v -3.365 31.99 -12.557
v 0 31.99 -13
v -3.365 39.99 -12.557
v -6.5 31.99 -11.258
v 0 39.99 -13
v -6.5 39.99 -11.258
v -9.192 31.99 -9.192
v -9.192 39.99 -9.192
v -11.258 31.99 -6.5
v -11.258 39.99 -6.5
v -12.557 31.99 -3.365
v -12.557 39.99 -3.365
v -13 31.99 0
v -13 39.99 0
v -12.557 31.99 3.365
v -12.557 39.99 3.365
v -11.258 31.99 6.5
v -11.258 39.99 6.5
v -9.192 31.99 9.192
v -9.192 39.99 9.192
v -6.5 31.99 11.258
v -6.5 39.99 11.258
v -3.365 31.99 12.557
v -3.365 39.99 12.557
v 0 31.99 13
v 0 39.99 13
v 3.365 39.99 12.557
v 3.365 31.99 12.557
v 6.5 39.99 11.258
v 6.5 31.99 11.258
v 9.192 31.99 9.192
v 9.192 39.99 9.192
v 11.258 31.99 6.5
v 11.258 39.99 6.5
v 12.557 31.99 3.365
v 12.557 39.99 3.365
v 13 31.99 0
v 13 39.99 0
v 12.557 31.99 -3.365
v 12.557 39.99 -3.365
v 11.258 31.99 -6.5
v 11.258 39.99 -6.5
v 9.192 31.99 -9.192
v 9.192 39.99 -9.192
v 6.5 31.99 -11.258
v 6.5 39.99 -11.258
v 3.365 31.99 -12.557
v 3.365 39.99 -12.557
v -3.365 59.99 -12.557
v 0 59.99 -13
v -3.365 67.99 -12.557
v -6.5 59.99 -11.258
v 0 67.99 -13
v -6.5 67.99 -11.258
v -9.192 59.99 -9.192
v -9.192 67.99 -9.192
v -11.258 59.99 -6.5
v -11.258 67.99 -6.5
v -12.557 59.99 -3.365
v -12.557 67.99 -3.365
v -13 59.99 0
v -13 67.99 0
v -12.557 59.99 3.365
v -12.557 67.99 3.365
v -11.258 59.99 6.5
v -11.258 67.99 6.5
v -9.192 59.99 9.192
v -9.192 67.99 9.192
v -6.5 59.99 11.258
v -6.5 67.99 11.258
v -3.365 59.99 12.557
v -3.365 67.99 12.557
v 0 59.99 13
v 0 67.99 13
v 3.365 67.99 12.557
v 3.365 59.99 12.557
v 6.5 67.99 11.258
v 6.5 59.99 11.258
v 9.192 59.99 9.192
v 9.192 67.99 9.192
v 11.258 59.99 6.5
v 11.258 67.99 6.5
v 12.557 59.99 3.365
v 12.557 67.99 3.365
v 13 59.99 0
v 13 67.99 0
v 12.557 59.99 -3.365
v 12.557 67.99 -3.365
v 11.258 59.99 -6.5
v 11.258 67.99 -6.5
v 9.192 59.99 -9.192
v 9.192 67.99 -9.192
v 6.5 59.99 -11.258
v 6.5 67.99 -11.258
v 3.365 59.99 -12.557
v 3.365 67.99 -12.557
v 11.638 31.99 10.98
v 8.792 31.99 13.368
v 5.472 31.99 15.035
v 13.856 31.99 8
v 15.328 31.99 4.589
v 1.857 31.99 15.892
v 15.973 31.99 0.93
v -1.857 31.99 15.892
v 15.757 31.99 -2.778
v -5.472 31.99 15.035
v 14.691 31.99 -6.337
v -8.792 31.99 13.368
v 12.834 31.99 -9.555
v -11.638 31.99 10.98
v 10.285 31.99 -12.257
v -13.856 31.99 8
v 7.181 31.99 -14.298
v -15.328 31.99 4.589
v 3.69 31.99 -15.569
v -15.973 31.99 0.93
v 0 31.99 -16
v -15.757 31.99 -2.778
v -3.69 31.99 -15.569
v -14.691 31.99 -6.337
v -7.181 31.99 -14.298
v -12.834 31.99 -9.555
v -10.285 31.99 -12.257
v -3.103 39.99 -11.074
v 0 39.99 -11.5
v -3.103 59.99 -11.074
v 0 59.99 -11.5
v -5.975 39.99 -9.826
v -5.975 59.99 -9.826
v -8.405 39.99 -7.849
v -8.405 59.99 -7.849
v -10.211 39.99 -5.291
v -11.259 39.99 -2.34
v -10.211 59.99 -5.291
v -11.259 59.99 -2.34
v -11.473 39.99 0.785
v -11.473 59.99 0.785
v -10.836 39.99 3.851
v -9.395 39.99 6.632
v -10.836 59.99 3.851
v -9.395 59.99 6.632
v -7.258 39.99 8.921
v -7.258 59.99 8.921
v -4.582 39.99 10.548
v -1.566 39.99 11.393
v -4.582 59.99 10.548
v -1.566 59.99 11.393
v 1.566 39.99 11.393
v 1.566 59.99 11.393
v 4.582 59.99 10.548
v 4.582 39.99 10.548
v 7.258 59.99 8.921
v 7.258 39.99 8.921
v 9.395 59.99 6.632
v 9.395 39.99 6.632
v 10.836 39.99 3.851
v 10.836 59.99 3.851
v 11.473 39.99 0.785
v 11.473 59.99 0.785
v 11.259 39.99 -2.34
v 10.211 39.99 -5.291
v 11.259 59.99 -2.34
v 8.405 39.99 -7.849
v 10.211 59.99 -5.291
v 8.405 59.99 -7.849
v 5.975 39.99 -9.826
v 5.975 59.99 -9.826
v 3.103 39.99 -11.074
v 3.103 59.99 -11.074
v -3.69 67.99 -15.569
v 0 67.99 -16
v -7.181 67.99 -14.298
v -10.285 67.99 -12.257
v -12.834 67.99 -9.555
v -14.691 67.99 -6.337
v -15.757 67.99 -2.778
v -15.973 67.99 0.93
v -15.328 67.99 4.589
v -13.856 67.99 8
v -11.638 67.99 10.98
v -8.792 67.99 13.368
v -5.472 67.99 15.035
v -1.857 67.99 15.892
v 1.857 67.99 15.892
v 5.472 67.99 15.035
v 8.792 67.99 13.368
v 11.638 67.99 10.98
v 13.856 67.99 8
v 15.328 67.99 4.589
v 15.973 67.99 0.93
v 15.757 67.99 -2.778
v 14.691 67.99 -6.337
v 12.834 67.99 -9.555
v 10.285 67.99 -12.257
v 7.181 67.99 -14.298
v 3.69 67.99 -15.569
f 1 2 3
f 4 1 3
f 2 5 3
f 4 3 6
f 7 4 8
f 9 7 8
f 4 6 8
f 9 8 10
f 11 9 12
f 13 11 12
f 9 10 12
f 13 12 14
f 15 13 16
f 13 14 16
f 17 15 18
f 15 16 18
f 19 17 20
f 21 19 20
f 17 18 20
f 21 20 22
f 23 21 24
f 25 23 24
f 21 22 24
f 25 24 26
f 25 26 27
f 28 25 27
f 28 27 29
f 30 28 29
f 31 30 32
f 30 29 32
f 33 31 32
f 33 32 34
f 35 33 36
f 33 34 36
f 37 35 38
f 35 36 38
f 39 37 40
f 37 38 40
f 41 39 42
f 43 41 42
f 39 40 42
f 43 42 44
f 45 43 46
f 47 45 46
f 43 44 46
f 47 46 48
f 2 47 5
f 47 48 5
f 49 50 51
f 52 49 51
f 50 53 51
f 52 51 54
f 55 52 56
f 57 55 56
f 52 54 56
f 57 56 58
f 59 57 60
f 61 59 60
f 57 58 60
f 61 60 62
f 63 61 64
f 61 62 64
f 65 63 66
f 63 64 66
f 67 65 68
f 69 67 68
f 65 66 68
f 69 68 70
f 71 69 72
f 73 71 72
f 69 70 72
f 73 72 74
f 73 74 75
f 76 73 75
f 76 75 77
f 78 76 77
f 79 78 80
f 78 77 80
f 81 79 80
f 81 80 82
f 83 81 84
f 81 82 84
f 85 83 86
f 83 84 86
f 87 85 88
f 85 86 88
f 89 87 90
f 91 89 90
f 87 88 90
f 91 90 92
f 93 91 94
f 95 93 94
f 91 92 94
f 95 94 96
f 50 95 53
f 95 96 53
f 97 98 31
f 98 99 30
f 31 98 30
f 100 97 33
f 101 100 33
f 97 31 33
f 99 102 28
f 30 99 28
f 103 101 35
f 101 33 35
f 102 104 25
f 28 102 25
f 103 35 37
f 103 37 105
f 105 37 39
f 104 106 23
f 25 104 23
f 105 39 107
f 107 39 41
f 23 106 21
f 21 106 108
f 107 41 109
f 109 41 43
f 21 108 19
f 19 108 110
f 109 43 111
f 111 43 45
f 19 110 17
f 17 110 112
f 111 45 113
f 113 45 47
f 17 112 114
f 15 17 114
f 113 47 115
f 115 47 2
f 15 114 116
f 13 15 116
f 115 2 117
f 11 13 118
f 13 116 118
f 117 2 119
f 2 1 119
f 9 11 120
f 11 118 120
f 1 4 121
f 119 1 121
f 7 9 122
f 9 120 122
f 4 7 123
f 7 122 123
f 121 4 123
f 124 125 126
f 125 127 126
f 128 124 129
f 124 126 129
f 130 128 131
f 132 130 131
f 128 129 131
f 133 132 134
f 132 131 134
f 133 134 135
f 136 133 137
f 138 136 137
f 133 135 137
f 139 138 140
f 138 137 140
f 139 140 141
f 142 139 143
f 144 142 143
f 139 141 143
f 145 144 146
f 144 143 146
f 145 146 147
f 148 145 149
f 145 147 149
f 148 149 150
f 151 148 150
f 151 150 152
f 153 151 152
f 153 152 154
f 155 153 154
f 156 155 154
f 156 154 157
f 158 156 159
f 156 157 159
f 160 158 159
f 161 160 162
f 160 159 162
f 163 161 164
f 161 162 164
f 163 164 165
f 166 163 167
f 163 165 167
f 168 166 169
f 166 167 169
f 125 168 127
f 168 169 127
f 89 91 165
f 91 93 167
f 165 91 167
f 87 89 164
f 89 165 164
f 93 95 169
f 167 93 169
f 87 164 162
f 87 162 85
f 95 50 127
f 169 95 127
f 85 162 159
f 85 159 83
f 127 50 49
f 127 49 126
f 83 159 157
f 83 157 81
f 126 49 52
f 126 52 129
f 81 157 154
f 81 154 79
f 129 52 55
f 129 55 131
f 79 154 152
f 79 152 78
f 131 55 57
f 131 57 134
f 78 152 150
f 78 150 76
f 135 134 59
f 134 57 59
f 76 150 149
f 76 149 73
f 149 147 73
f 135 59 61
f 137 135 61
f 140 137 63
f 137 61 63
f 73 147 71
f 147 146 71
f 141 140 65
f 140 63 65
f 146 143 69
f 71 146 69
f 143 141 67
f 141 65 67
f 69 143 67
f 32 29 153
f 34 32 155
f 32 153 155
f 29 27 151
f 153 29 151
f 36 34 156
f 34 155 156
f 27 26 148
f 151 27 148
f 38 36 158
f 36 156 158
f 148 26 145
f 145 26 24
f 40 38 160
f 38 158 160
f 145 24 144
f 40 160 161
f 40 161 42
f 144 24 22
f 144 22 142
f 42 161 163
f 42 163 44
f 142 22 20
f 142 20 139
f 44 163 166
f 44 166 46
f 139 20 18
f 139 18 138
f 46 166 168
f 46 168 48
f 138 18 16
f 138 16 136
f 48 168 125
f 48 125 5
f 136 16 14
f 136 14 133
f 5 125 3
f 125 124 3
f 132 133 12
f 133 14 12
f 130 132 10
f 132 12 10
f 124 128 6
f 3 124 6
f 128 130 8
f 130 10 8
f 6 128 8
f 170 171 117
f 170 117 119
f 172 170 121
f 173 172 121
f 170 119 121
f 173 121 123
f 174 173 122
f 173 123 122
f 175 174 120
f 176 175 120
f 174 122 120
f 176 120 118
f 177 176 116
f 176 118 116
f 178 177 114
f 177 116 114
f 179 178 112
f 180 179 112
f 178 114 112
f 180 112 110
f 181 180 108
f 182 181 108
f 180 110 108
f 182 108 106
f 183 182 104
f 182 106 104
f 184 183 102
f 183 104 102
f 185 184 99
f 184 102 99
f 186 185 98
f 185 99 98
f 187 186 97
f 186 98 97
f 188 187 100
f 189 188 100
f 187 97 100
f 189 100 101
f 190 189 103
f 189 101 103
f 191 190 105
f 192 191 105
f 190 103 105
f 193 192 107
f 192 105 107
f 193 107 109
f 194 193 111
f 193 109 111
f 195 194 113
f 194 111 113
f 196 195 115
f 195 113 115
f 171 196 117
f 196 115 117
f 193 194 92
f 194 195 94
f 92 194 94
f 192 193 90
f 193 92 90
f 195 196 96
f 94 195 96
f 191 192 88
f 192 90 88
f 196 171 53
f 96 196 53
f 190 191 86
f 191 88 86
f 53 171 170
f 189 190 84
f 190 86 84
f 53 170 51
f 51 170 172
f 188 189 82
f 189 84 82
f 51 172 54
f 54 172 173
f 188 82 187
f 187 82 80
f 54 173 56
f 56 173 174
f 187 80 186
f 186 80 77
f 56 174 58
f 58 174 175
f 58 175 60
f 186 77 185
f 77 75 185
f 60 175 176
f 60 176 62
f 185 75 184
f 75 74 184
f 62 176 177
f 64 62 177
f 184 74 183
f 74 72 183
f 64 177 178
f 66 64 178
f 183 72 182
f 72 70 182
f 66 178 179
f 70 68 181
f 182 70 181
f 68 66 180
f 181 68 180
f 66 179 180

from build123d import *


with BuildPart() as part:
    # Croquis1 → Revolución1 (revolve)
    with BuildSketch(Plane.XY, mode=Mode.PRIVATE) as revoluci_n1_sk:
        Polygon((-13, 67.989509587), (-16, 67.989509587), (-16, 31.989509587), (-13, 31.989509587), (-13, 39.989509587), (-11.5, 39.989509587), (-11.5, 59.989509587), (-13, 59.989509587), align=None)
    revolve(revoluci_n1_sk.sketch.rotate(Axis((0, 0, 0), (0, 1, 0)), 270), axis=Axis((0, 0, 0), (0, 1, 0)))


solid = part.part
